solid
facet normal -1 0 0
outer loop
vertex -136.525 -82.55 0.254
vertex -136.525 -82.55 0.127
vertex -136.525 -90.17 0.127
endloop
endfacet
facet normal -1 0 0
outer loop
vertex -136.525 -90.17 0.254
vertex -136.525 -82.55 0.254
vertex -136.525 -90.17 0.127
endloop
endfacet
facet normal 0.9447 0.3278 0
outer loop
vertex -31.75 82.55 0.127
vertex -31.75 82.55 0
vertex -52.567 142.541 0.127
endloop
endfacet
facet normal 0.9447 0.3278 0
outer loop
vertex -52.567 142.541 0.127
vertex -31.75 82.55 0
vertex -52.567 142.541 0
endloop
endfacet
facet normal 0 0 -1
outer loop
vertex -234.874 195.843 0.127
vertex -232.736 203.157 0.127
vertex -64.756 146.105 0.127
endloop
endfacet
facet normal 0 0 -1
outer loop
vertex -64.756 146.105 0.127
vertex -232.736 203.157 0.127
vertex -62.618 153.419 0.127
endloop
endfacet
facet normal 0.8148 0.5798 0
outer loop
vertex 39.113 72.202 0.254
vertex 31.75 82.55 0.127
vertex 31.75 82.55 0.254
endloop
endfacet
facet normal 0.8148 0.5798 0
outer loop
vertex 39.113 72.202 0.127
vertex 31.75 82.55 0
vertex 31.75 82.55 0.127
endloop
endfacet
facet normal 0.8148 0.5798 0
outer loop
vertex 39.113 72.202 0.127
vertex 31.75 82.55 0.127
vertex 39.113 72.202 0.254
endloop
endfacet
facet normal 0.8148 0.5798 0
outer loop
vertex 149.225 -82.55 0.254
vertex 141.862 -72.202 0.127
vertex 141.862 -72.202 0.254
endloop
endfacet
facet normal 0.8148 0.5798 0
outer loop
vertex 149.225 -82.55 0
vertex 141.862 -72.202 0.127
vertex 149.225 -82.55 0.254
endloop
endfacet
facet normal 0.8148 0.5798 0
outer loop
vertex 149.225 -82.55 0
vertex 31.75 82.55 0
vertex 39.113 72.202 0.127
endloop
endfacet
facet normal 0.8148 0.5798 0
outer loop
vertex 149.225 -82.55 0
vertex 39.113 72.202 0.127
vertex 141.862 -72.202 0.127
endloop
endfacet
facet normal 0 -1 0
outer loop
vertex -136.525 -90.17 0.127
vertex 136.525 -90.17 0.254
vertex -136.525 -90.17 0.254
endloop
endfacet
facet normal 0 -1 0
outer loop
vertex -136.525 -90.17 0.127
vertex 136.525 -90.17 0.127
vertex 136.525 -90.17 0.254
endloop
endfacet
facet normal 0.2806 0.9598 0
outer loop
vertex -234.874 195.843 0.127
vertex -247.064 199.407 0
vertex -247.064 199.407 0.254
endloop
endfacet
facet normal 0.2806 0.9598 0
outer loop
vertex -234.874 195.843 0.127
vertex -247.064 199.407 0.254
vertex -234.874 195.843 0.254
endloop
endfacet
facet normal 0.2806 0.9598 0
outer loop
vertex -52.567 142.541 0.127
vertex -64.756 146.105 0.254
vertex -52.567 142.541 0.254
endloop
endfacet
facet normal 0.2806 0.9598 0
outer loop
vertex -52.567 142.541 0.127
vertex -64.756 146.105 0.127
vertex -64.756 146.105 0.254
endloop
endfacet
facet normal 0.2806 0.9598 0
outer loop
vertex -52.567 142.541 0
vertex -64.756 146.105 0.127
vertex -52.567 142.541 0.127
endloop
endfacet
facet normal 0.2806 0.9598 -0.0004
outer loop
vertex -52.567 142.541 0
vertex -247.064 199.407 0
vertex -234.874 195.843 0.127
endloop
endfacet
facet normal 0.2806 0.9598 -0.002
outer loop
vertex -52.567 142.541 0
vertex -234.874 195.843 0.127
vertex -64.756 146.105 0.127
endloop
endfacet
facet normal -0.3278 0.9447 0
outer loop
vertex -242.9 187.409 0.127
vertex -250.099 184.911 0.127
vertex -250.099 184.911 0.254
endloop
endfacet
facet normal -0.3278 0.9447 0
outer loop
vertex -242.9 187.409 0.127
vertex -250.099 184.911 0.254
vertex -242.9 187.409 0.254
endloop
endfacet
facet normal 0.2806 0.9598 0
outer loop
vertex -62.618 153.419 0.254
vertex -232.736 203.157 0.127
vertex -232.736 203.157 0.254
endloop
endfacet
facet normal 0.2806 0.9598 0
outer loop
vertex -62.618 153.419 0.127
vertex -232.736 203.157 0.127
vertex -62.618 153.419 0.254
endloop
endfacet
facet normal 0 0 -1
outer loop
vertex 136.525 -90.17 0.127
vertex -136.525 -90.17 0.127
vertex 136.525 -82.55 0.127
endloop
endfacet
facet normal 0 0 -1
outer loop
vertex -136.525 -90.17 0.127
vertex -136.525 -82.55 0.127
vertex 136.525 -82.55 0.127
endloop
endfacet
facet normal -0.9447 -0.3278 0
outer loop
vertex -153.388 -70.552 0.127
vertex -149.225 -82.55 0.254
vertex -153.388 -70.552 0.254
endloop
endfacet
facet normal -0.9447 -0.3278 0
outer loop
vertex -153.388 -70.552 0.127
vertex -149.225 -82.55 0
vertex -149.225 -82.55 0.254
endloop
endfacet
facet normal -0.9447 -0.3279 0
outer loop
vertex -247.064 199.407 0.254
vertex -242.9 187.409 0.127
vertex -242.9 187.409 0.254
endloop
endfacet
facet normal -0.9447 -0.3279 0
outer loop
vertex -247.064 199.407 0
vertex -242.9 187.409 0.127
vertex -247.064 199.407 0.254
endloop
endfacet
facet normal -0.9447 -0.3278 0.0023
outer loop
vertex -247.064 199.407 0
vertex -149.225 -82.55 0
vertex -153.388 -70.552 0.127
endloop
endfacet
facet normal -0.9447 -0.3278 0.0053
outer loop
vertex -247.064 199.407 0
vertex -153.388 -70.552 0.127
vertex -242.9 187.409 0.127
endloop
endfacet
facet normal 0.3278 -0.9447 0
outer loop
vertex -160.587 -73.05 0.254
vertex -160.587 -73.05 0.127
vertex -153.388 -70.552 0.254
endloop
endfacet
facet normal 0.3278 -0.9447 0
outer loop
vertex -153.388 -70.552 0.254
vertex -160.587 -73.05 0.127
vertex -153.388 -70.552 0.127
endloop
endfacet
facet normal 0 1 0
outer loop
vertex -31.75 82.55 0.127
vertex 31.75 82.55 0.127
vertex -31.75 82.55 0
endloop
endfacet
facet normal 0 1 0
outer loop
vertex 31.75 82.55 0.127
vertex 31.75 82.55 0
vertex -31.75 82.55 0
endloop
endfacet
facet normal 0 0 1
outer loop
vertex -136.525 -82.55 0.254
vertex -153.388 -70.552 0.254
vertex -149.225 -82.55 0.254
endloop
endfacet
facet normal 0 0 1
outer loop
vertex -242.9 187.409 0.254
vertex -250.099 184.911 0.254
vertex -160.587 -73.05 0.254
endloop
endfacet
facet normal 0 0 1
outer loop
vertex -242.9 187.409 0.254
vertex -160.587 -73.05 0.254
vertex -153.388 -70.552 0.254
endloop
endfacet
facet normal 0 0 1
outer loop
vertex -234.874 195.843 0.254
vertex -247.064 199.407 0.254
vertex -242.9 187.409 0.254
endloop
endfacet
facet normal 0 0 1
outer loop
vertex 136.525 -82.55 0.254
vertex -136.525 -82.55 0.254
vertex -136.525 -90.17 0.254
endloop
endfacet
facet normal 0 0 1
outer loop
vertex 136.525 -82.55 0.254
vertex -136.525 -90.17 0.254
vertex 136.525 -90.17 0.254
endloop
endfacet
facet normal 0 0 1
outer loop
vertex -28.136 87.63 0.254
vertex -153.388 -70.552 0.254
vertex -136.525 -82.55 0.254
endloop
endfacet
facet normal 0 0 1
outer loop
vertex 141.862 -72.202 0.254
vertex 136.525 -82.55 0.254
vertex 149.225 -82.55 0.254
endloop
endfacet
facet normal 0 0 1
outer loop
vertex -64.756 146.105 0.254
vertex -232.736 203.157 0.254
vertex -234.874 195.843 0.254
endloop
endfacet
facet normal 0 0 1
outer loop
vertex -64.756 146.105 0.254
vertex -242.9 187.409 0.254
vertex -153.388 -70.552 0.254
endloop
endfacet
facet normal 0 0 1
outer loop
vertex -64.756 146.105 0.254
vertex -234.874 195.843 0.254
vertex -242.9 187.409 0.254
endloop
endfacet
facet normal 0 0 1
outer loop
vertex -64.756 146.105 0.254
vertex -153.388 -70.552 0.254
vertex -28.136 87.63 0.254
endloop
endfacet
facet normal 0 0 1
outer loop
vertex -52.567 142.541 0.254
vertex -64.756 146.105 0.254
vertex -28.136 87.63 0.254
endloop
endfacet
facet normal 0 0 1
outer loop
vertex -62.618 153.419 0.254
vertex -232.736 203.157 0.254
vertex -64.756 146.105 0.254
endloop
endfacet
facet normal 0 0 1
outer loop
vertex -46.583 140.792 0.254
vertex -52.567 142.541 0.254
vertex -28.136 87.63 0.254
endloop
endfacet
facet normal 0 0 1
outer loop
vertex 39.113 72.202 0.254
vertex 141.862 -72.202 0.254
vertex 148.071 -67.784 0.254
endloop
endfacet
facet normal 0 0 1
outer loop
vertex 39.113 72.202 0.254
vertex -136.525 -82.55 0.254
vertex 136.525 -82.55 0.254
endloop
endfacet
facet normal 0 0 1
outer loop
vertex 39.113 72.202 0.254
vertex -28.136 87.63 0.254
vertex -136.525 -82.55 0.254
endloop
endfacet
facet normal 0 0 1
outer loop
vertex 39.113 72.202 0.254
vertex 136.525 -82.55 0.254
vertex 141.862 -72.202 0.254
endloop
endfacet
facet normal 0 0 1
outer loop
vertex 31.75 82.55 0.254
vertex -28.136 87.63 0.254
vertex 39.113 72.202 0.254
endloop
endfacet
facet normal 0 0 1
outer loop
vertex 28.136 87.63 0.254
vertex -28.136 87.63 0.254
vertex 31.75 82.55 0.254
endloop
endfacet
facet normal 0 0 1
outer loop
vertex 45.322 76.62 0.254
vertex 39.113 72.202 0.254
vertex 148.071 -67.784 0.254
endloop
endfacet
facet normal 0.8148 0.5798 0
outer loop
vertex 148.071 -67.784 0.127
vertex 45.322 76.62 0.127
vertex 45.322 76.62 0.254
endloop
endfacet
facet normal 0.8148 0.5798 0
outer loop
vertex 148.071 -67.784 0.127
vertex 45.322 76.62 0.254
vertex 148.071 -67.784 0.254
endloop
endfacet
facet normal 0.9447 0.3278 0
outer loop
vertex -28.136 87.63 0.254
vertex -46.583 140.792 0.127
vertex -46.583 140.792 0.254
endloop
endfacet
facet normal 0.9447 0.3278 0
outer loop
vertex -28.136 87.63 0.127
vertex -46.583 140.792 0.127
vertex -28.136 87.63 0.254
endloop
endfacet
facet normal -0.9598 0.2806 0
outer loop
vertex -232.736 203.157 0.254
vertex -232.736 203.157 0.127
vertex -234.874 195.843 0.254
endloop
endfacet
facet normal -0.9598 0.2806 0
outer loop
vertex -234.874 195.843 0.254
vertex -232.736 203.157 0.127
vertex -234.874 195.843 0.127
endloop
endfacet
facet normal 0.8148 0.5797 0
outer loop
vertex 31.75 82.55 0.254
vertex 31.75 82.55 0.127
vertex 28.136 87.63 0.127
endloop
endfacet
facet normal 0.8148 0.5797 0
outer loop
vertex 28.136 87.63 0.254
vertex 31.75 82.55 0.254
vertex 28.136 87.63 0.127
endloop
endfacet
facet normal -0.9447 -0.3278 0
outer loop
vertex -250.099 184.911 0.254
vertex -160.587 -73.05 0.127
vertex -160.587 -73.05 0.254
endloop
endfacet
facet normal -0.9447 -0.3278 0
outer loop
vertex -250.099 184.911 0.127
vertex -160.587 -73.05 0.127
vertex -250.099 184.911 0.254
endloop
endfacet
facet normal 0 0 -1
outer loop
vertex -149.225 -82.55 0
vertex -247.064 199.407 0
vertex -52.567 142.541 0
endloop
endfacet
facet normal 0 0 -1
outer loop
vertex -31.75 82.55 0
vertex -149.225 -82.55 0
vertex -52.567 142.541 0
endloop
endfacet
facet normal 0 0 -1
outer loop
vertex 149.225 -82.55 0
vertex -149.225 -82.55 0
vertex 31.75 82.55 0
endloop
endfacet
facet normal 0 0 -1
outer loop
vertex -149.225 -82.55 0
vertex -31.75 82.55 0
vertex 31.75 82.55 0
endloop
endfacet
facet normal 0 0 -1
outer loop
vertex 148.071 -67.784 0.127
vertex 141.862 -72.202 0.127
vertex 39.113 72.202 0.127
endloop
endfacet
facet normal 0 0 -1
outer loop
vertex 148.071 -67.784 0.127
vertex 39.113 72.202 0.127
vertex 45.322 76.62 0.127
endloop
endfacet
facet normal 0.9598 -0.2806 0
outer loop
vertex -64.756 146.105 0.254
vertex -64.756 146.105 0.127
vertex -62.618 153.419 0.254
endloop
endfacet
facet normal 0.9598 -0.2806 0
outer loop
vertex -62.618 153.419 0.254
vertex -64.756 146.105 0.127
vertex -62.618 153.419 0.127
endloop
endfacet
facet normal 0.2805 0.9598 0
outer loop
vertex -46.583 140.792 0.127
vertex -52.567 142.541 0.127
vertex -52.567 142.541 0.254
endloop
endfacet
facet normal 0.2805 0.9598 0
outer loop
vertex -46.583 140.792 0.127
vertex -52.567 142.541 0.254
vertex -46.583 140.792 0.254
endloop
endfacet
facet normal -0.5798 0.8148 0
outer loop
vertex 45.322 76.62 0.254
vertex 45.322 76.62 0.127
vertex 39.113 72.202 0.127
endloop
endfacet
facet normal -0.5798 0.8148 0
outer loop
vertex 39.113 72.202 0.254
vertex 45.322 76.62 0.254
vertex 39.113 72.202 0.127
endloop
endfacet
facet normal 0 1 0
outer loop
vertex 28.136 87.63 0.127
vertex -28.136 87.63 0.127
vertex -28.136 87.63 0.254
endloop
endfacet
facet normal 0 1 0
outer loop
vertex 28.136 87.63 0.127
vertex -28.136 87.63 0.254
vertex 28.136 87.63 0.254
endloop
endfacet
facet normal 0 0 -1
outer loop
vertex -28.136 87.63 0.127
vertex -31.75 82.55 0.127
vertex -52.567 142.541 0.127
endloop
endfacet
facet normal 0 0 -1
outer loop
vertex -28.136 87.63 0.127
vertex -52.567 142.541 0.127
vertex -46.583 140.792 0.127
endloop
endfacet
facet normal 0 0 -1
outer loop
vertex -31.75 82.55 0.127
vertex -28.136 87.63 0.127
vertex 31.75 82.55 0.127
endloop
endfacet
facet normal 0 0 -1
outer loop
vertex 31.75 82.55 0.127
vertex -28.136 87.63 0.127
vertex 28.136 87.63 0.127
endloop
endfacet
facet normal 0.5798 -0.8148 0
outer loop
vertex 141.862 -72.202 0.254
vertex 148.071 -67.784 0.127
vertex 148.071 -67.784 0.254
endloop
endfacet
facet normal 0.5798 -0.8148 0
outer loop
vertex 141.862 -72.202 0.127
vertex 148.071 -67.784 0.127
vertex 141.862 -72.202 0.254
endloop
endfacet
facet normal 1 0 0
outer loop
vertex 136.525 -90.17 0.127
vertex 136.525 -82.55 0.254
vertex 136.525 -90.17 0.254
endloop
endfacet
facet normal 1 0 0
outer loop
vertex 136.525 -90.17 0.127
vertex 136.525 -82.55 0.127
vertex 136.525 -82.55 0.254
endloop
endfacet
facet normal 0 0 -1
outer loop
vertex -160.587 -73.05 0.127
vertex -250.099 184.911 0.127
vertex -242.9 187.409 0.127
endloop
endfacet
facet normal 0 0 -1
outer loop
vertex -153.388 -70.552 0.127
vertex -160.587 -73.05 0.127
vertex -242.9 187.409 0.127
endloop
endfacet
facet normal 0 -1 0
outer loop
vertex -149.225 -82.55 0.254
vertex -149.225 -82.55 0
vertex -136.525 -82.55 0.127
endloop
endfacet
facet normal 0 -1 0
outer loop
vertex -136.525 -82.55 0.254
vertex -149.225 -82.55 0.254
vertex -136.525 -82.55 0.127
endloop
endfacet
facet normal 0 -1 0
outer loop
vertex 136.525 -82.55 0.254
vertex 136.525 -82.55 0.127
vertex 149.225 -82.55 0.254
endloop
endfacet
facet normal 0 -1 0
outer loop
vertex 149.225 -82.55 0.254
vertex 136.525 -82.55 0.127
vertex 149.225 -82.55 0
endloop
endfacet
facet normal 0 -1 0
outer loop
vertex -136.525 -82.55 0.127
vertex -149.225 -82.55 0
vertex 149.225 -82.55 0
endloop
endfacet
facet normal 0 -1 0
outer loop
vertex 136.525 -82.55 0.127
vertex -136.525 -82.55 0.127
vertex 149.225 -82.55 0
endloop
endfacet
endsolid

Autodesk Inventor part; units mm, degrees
ref_plane "YZ Plane" through (0, 0, 0) normal (1, 0, 0) x (0, 1, 0)
ref_plane "XZ Plane" through (0, 0, 0) normal (0, 1, 0) x (-1, 0, 0)
ref_plane "XY Plane" through (0, 0, 0) normal (0, 0, 1) x (1, 0, 0)
sketch "Sketch1" plane through (0, 0, 0) normal (0, 0, 1) x (1, 0, 0)
  line L0 (-149.2247, -82.55) -> (149.2253, -82.55)
  line L1 (31.75, 82.55) -> (-31.75, 82.55)
  line L2 (31.75, 82.55) -> (149.2253, -82.55)
  line L3 (-31.75, 82.55) -> (-149.2247, -82.55)
  line L4 (-149.2247, -82.55) -> (-247.0638, 199.4073)
  line L5 (-31.75, 82.55) -> (-52.5668, 142.5409)
  line L6 (-247.0638, 199.4073) -> (-52.5668, 142.5409)
  point P0 (0, 0)
  point P1 (0, 82.55)
  point P2 (-90.4873, 0)
  dimension "d1" = 298.45
  dimension "d2" = 63.5
  dimension "d3" = 165.1
  dimension "d4" = 202.6285
  dimension "d5" = 202.6289
  dimension "d31" = 125.433
  dimension "d32" = 125.433
  dimension "d33" = 54.567
  dimension "d34" = 54.567
  dimension "d35" = 54.57
  dimension "d36" = 298.45
  dimension "d37" = 125.43
  dimension "d38" = 63.5
  dimension "d39" = 202.6397
  dimension "d40" = 54.566
  dimension "d41" = 125.434
extrude "Extrusion2" add sketch "Sketch1" along normal blind 0.127
sketch "Sketch3" plane through (0, 0, 0.127) normal (0, 0, 1) x (1, 0, 0)
  line L0 (31.75, 82.55) -> (-31.75, 82.55) projected
  line L1 (-31.75, 82.55) -> (31.75, 82.55)
  line L2 (-31.75, 82.55) -> (-28.1358, 87.63)
  line L3 (31.75, 82.55) -> (28.1358, 87.63)
  line L4 (-28.1358, 87.63) -> (28.1358, 87.63)
  line L5 (-31.75, 82.55) -> (-52.5668, 142.5409) projected
  line L6 (-52.5668, 142.5409) -> (-46.5827, 140.7918)
  line L7 (-46.5827, 140.7918) -> (-28.1358, 87.63)
  line L8 (-149.2247, -82.55) -> (149.2253, -82.55) projected
  line L9 (-52.5668, 142.5409) -> (-247.0638, 199.4073) projected
  line L10 (-247.0638, 199.4073) -> (-149.2247, -82.55) projected
  line L11 (136.5253, -90.17) -> (-136.5247, -90.17)
  line L12 (-247.0638, 199.4073) -> (-149.2247, -82.55) projected
  line L13 (-160.5869, -73.0498) -> (-250.0993, 184.9111)
  line L14 (-232.7357, 203.1571) -> (-62.6181, 153.4187)
  line L15 (-31.75, 82.55) -> (31.75, 82.55)
  line L16 (149.2253, -82.55) -> (31.75, 82.55) projected
  line L17 (45.3216, 76.6199) -> (148.0711, -67.7844)
  line L18 (31.75, 82.55) -> (149.2253, -82.55)
  line L19 (-52.5668, 142.5409) -> (-31.75, 82.55)
  line L20 (-46.5827, 140.7918) -> (-28.1358, 87.63)
  line L21 (-28.1358, 87.63) -> (28.1358, 87.63)
  line L22 (-232.7357, 203.1571) -> (-234.8741, 195.8433)
  line L23 (-64.7565, 146.1049) -> (-62.6181, 153.4187)
  line L24 (-250.0993, 184.9111) -> (-242.9004, 187.4091)
  line L25 (-160.5869, -73.0498) -> (-153.388, -70.5518)
  line L26 (-136.5247, -82.55) -> (-136.5247, -90.17)
  line L27 (136.5253, -82.55) -> (136.5253, -90.17)
  line L28 (148.0711, -67.7844) -> (141.8624, -72.2022)
  line L29 (45.3216, 76.6199) -> (39.1129, 72.2022)
  point P0 (0, 0)
  dimension "d45" = 54.57
  dimension "d46" = 5.08
  dimension "d47" = 54.57
  dimension "d48" = 54.57
  dimension "d51" = 5.08
  dimension "d68" = 7.62
  dimension "d84" = 7.62
  dimension "d89" = 90
  dimension "d90" = 12.7
  dimension "d91" = 7.62
  dimension "d93" = 90
  dimension "d94" = 12.7
  dimension "d95" = 12.7
  dimension "d97" = 12.7
  dimension "d98" = 90
  dimension "d99" = 90
  dimension "d100" = 7.62
  dimension "d101" = 12.7
  dimension "d102" = 12.7
  dimension "d103" = 7.62
  dimension "d104" = 7.62
  dimension "d105" = 12.7
  dimension "d106" = 12.7
  dimension "d107" = 7.62
  dimension "d108" = 7.62
  dimension "d109" = 90
extrude "Extrusion4" add sketch "Sketch3" along normal blind 0.127
sketch "Sketch5" plane through (0, 0, 0.254) normal (0, 0, 1) x (1, 0, 0)
  line L0 (31.75, 82.55) -> (-31.75, 82.55) projected
  line L1 (31.75, 82.55) -> (-31.75, 82.55)
  line L2 (-149.2247, -82.55) -> (149.2253, -82.55) projected
  line L3 (31.75, 82.55) -> (149.2253, -82.55)
  line L4 (149.2253, -82.55) -> (-149.2247, -82.55)
  line L5 (-242.9004, 187.4091) -> (-149.2247, -82.55) projected
  line L6 (-149.2247, -82.55) -> (-247.0638, 199.4073)
  line L7 (-247.0638, 199.4073) -> (-52.5668, 142.5409)
  line L8 (-31.75, 82.55) -> (-52.5668, 142.5409) projected
  line L9 (-52.5668, 142.5409) -> (-31.75, 82.55)
  line L10 (-31.75, 82.55) -> (-28.1358, 87.63)
  line L11 (-31.75, 82.55) -> (-149.2247, -82.55)
properties part number "DELL screen 3D hologram piece"
